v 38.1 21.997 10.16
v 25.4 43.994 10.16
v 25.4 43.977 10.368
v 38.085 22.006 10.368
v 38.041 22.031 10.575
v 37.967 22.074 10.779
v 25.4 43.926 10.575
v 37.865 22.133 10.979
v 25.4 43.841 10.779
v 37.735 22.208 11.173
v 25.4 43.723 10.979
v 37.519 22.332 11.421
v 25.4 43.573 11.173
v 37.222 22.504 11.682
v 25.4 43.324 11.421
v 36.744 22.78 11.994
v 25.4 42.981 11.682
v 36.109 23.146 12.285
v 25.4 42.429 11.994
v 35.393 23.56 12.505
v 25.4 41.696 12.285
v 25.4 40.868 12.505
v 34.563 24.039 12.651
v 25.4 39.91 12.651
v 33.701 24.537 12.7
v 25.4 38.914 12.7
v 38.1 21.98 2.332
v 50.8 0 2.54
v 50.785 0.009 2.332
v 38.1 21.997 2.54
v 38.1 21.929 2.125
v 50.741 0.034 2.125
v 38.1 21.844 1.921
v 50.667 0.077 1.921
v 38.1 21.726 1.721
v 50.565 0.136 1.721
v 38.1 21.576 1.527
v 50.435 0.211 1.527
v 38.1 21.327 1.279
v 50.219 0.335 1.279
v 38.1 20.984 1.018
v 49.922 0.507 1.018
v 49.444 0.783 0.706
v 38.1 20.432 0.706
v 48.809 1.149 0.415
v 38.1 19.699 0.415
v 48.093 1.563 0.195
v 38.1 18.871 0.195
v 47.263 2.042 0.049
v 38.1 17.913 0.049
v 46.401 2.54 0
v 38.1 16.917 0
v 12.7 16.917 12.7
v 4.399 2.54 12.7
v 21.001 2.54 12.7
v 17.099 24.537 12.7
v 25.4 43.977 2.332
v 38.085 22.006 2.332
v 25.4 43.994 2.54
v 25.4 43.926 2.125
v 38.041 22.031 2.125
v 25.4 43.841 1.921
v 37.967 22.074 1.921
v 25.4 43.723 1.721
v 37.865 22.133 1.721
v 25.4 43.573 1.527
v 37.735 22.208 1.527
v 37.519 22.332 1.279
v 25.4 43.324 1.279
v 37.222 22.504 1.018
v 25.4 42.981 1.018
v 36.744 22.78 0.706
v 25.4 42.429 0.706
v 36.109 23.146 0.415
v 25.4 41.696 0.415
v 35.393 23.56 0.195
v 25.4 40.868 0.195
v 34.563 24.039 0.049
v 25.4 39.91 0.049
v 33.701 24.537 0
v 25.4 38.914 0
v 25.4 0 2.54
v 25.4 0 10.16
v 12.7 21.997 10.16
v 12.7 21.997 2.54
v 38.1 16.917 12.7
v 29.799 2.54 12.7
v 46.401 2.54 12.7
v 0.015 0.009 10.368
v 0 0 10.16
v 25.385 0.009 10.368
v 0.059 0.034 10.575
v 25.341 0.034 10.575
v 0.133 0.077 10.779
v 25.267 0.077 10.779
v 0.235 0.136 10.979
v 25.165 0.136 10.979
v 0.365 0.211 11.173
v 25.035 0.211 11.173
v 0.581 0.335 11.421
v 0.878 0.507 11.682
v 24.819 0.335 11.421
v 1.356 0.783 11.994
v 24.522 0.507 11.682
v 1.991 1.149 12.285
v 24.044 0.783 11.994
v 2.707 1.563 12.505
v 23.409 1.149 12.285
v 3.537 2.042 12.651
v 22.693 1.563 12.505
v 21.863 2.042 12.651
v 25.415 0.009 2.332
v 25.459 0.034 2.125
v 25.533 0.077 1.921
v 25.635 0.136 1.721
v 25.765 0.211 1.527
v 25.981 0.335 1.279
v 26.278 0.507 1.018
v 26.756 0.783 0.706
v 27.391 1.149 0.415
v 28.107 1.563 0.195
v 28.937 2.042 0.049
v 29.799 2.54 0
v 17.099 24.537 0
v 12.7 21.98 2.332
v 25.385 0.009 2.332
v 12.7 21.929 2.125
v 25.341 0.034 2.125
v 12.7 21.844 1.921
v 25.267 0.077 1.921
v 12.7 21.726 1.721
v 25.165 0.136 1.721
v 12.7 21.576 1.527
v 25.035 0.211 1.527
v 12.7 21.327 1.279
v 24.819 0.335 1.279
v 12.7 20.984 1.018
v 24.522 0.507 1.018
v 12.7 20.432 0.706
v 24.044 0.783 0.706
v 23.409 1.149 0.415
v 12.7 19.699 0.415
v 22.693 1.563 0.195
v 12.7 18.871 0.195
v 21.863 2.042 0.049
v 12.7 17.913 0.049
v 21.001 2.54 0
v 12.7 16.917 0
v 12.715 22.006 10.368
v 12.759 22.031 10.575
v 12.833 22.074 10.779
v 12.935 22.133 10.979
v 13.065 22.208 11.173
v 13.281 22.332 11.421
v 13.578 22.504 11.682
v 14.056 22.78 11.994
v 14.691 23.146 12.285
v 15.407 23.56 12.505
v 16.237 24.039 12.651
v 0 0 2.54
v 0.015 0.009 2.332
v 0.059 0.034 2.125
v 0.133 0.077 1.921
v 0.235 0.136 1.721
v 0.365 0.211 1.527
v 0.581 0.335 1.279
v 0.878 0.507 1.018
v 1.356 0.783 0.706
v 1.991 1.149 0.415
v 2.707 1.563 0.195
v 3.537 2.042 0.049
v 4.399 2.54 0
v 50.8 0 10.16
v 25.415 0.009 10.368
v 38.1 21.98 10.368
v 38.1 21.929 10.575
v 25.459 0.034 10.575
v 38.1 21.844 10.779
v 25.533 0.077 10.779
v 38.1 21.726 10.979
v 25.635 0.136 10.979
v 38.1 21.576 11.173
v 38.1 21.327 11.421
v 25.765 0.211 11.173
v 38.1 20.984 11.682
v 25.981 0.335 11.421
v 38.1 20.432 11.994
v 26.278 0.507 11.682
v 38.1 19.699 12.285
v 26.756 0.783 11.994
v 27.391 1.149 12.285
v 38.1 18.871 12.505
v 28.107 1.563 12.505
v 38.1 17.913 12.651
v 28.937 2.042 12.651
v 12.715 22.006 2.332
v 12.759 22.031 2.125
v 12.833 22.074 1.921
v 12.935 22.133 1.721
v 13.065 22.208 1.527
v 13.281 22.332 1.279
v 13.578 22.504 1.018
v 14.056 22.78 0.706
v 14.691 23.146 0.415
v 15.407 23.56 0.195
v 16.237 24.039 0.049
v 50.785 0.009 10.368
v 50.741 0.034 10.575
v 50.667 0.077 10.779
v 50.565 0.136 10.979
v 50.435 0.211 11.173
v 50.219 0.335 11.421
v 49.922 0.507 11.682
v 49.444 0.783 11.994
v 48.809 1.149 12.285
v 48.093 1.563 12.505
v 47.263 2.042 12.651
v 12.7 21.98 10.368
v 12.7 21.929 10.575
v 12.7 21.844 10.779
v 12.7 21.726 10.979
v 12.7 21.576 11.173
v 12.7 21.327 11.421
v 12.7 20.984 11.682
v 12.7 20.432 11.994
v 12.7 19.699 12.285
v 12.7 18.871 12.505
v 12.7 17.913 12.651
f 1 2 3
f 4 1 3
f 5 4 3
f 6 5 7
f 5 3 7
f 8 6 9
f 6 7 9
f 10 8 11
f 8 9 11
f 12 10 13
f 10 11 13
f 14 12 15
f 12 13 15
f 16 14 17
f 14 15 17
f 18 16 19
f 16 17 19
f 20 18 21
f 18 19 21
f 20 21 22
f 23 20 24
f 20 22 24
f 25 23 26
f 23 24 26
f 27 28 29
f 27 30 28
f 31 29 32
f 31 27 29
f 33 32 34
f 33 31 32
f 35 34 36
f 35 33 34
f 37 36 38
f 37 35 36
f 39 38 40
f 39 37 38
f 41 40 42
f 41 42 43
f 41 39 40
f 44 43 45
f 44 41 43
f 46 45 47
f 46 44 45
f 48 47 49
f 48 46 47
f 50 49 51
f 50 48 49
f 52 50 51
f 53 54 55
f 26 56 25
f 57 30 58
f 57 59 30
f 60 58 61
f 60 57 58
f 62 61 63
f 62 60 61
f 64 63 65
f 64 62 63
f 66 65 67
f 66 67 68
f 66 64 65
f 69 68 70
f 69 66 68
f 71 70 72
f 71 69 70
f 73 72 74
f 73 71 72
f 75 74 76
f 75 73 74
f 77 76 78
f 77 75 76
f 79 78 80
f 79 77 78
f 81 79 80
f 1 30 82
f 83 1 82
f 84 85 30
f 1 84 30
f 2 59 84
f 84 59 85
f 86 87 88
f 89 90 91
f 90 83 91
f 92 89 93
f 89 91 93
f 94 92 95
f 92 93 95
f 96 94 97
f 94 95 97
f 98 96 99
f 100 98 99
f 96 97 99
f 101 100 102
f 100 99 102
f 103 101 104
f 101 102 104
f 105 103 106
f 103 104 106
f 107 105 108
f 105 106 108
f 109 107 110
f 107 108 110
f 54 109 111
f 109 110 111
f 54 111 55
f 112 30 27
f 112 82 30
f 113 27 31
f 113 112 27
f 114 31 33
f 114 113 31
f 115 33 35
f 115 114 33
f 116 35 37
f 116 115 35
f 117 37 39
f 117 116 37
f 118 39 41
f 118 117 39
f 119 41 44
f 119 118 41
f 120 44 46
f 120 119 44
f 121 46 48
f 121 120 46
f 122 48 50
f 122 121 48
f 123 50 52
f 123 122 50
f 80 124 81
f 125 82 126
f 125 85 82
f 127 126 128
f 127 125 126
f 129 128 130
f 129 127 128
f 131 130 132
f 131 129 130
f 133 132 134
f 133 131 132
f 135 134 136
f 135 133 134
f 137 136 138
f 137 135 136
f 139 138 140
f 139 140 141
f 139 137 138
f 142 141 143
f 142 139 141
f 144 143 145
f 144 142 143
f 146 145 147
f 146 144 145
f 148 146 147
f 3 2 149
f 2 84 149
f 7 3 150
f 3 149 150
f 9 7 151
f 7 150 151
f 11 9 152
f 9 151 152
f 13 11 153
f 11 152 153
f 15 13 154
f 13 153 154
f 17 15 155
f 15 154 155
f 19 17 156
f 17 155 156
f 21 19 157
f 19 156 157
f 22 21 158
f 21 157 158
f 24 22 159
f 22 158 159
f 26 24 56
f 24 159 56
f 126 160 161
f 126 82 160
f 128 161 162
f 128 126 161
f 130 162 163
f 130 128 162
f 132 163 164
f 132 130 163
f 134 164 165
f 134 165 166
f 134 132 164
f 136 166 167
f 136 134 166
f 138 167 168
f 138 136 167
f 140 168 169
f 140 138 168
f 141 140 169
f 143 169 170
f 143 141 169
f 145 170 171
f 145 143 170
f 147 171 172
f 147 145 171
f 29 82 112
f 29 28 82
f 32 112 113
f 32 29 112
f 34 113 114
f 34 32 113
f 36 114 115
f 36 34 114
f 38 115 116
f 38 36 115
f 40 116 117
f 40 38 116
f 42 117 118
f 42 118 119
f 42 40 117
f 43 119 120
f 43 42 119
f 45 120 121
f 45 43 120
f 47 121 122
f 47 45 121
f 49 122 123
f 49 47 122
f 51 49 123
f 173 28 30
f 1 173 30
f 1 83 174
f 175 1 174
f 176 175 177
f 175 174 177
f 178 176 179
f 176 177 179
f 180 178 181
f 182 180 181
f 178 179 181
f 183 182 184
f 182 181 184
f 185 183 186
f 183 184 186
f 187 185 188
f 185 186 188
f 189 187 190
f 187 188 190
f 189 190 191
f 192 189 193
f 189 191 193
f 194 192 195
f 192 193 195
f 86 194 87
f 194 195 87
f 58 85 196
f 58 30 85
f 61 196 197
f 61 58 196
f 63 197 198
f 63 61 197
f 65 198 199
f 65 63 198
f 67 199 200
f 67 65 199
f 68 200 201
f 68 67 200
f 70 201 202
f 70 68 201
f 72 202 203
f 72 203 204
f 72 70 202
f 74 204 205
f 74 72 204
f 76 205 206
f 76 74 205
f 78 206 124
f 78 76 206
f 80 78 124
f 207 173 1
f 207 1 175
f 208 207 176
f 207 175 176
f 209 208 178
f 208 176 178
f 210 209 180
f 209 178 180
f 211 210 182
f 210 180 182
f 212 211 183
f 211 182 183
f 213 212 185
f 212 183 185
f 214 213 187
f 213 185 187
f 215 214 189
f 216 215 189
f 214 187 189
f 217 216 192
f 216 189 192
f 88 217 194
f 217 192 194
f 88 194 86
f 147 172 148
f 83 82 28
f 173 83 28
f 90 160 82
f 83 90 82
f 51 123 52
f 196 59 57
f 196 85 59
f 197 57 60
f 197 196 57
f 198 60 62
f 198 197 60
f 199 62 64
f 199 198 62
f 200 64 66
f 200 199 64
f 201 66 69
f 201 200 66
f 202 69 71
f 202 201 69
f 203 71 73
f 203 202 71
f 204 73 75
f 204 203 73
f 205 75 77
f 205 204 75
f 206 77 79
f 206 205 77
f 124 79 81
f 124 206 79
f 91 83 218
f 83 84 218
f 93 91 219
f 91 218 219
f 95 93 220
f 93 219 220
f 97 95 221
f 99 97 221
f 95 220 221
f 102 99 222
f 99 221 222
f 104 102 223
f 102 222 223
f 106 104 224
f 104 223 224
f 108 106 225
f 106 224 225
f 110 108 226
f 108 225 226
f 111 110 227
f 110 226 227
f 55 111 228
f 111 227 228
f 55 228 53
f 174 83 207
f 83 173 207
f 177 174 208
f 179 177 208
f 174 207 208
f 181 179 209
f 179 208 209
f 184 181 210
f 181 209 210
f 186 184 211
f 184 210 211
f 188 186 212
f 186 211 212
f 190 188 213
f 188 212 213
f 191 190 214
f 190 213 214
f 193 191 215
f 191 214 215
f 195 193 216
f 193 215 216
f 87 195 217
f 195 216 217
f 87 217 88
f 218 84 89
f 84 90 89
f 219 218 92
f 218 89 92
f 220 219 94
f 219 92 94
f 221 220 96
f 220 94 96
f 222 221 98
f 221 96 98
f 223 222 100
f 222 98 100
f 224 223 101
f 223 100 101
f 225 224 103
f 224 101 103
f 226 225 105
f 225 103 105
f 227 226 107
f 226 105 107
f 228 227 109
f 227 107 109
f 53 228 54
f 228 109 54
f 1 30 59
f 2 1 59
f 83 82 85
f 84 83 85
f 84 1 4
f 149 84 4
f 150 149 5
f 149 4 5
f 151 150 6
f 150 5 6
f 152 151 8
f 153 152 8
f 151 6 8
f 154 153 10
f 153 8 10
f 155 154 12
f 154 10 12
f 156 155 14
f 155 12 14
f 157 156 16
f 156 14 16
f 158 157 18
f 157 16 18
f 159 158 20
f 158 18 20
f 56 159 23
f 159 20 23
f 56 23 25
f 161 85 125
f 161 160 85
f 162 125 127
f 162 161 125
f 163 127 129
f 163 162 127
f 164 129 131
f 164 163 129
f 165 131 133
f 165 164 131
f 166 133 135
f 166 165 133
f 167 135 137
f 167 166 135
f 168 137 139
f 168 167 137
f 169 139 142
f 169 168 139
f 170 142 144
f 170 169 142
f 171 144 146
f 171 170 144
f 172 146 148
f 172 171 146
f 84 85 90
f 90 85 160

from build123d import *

# Parameters (mm, degrees)
F1_DEPTH = 12.7
F2_R     = 2.54
F2_2_R   = 2.54
F2_3_R   = 2.54


with BuildPart() as f1:
    # F0 (on Top) → F1 (new body)
    with BuildSketch(Plane.XY):
        Polygon((25.4, 43.9940905122), (12.7, 21.9970452561), (38.1, 21.9970452561), align=None)
    extrude(amount=F1_DEPTH)

    # F2#3
    f2_3_edges = [f1.edges().sort_by_distance(p)[0] for p in [
        (25.4, 21.997045, 12.7),
        (19.05, 32.995568, 12.7),
        (31.75, 32.995568, 12.7),
        (19.05, 32.995568, 0),
        (31.75, 32.995568, 0),
        (25.4, 21.997045, 0),
    ]]
    fillet(f2_3_edges, radius=F2_3_R)


with BuildPart() as f1b:
    # F0 (on Top) → F1, piece 2 (new body)
    with BuildSketch(Plane.XY):
        Polygon((12.7, 21.9970452561), (0, 0), (25.4, 0), align=None)
    extrude(amount=F1_DEPTH)

    # F2#2
    f2_2_edges = [f1b.edges().sort_by_distance(p)[0] for p in [
        (12.7, 0, 12.7),
        (19.05, 10.998523, 12.7),
        (6.35, 10.998523, 12.7),
        (12.7, 0, 0),
        (6.35, 10.998523, 0),
        (19.05, 10.998523, 0),
    ]]
    fillet(f2_2_edges, radius=F2_2_R)


with BuildPart() as f1c:
    # F0 (on Top) → F1, piece 3 (new body)
    with BuildSketch(Plane.XY):
        Polygon((38.1, 21.9970452561), (25.4, 0), (50.8, 0), align=None)
    extrude(amount=F1_DEPTH)

    # F2
    f2_edges = [f1c.edges().sort_by_distance(p)[0] for p in [
        (38.1, 0, 12.7),
        (44.45, 10.998523, 12.7),
        (38.1, 0, 0),
        (31.75, 10.998523, 0),
        (31.75, 10.998523, 12.7),
        (44.45, 10.998523, 0),
    ]]
    fillet(f2_edges, radius=F2_R)


solid = Compound([f1.part, f1b.part, f1c.part])
